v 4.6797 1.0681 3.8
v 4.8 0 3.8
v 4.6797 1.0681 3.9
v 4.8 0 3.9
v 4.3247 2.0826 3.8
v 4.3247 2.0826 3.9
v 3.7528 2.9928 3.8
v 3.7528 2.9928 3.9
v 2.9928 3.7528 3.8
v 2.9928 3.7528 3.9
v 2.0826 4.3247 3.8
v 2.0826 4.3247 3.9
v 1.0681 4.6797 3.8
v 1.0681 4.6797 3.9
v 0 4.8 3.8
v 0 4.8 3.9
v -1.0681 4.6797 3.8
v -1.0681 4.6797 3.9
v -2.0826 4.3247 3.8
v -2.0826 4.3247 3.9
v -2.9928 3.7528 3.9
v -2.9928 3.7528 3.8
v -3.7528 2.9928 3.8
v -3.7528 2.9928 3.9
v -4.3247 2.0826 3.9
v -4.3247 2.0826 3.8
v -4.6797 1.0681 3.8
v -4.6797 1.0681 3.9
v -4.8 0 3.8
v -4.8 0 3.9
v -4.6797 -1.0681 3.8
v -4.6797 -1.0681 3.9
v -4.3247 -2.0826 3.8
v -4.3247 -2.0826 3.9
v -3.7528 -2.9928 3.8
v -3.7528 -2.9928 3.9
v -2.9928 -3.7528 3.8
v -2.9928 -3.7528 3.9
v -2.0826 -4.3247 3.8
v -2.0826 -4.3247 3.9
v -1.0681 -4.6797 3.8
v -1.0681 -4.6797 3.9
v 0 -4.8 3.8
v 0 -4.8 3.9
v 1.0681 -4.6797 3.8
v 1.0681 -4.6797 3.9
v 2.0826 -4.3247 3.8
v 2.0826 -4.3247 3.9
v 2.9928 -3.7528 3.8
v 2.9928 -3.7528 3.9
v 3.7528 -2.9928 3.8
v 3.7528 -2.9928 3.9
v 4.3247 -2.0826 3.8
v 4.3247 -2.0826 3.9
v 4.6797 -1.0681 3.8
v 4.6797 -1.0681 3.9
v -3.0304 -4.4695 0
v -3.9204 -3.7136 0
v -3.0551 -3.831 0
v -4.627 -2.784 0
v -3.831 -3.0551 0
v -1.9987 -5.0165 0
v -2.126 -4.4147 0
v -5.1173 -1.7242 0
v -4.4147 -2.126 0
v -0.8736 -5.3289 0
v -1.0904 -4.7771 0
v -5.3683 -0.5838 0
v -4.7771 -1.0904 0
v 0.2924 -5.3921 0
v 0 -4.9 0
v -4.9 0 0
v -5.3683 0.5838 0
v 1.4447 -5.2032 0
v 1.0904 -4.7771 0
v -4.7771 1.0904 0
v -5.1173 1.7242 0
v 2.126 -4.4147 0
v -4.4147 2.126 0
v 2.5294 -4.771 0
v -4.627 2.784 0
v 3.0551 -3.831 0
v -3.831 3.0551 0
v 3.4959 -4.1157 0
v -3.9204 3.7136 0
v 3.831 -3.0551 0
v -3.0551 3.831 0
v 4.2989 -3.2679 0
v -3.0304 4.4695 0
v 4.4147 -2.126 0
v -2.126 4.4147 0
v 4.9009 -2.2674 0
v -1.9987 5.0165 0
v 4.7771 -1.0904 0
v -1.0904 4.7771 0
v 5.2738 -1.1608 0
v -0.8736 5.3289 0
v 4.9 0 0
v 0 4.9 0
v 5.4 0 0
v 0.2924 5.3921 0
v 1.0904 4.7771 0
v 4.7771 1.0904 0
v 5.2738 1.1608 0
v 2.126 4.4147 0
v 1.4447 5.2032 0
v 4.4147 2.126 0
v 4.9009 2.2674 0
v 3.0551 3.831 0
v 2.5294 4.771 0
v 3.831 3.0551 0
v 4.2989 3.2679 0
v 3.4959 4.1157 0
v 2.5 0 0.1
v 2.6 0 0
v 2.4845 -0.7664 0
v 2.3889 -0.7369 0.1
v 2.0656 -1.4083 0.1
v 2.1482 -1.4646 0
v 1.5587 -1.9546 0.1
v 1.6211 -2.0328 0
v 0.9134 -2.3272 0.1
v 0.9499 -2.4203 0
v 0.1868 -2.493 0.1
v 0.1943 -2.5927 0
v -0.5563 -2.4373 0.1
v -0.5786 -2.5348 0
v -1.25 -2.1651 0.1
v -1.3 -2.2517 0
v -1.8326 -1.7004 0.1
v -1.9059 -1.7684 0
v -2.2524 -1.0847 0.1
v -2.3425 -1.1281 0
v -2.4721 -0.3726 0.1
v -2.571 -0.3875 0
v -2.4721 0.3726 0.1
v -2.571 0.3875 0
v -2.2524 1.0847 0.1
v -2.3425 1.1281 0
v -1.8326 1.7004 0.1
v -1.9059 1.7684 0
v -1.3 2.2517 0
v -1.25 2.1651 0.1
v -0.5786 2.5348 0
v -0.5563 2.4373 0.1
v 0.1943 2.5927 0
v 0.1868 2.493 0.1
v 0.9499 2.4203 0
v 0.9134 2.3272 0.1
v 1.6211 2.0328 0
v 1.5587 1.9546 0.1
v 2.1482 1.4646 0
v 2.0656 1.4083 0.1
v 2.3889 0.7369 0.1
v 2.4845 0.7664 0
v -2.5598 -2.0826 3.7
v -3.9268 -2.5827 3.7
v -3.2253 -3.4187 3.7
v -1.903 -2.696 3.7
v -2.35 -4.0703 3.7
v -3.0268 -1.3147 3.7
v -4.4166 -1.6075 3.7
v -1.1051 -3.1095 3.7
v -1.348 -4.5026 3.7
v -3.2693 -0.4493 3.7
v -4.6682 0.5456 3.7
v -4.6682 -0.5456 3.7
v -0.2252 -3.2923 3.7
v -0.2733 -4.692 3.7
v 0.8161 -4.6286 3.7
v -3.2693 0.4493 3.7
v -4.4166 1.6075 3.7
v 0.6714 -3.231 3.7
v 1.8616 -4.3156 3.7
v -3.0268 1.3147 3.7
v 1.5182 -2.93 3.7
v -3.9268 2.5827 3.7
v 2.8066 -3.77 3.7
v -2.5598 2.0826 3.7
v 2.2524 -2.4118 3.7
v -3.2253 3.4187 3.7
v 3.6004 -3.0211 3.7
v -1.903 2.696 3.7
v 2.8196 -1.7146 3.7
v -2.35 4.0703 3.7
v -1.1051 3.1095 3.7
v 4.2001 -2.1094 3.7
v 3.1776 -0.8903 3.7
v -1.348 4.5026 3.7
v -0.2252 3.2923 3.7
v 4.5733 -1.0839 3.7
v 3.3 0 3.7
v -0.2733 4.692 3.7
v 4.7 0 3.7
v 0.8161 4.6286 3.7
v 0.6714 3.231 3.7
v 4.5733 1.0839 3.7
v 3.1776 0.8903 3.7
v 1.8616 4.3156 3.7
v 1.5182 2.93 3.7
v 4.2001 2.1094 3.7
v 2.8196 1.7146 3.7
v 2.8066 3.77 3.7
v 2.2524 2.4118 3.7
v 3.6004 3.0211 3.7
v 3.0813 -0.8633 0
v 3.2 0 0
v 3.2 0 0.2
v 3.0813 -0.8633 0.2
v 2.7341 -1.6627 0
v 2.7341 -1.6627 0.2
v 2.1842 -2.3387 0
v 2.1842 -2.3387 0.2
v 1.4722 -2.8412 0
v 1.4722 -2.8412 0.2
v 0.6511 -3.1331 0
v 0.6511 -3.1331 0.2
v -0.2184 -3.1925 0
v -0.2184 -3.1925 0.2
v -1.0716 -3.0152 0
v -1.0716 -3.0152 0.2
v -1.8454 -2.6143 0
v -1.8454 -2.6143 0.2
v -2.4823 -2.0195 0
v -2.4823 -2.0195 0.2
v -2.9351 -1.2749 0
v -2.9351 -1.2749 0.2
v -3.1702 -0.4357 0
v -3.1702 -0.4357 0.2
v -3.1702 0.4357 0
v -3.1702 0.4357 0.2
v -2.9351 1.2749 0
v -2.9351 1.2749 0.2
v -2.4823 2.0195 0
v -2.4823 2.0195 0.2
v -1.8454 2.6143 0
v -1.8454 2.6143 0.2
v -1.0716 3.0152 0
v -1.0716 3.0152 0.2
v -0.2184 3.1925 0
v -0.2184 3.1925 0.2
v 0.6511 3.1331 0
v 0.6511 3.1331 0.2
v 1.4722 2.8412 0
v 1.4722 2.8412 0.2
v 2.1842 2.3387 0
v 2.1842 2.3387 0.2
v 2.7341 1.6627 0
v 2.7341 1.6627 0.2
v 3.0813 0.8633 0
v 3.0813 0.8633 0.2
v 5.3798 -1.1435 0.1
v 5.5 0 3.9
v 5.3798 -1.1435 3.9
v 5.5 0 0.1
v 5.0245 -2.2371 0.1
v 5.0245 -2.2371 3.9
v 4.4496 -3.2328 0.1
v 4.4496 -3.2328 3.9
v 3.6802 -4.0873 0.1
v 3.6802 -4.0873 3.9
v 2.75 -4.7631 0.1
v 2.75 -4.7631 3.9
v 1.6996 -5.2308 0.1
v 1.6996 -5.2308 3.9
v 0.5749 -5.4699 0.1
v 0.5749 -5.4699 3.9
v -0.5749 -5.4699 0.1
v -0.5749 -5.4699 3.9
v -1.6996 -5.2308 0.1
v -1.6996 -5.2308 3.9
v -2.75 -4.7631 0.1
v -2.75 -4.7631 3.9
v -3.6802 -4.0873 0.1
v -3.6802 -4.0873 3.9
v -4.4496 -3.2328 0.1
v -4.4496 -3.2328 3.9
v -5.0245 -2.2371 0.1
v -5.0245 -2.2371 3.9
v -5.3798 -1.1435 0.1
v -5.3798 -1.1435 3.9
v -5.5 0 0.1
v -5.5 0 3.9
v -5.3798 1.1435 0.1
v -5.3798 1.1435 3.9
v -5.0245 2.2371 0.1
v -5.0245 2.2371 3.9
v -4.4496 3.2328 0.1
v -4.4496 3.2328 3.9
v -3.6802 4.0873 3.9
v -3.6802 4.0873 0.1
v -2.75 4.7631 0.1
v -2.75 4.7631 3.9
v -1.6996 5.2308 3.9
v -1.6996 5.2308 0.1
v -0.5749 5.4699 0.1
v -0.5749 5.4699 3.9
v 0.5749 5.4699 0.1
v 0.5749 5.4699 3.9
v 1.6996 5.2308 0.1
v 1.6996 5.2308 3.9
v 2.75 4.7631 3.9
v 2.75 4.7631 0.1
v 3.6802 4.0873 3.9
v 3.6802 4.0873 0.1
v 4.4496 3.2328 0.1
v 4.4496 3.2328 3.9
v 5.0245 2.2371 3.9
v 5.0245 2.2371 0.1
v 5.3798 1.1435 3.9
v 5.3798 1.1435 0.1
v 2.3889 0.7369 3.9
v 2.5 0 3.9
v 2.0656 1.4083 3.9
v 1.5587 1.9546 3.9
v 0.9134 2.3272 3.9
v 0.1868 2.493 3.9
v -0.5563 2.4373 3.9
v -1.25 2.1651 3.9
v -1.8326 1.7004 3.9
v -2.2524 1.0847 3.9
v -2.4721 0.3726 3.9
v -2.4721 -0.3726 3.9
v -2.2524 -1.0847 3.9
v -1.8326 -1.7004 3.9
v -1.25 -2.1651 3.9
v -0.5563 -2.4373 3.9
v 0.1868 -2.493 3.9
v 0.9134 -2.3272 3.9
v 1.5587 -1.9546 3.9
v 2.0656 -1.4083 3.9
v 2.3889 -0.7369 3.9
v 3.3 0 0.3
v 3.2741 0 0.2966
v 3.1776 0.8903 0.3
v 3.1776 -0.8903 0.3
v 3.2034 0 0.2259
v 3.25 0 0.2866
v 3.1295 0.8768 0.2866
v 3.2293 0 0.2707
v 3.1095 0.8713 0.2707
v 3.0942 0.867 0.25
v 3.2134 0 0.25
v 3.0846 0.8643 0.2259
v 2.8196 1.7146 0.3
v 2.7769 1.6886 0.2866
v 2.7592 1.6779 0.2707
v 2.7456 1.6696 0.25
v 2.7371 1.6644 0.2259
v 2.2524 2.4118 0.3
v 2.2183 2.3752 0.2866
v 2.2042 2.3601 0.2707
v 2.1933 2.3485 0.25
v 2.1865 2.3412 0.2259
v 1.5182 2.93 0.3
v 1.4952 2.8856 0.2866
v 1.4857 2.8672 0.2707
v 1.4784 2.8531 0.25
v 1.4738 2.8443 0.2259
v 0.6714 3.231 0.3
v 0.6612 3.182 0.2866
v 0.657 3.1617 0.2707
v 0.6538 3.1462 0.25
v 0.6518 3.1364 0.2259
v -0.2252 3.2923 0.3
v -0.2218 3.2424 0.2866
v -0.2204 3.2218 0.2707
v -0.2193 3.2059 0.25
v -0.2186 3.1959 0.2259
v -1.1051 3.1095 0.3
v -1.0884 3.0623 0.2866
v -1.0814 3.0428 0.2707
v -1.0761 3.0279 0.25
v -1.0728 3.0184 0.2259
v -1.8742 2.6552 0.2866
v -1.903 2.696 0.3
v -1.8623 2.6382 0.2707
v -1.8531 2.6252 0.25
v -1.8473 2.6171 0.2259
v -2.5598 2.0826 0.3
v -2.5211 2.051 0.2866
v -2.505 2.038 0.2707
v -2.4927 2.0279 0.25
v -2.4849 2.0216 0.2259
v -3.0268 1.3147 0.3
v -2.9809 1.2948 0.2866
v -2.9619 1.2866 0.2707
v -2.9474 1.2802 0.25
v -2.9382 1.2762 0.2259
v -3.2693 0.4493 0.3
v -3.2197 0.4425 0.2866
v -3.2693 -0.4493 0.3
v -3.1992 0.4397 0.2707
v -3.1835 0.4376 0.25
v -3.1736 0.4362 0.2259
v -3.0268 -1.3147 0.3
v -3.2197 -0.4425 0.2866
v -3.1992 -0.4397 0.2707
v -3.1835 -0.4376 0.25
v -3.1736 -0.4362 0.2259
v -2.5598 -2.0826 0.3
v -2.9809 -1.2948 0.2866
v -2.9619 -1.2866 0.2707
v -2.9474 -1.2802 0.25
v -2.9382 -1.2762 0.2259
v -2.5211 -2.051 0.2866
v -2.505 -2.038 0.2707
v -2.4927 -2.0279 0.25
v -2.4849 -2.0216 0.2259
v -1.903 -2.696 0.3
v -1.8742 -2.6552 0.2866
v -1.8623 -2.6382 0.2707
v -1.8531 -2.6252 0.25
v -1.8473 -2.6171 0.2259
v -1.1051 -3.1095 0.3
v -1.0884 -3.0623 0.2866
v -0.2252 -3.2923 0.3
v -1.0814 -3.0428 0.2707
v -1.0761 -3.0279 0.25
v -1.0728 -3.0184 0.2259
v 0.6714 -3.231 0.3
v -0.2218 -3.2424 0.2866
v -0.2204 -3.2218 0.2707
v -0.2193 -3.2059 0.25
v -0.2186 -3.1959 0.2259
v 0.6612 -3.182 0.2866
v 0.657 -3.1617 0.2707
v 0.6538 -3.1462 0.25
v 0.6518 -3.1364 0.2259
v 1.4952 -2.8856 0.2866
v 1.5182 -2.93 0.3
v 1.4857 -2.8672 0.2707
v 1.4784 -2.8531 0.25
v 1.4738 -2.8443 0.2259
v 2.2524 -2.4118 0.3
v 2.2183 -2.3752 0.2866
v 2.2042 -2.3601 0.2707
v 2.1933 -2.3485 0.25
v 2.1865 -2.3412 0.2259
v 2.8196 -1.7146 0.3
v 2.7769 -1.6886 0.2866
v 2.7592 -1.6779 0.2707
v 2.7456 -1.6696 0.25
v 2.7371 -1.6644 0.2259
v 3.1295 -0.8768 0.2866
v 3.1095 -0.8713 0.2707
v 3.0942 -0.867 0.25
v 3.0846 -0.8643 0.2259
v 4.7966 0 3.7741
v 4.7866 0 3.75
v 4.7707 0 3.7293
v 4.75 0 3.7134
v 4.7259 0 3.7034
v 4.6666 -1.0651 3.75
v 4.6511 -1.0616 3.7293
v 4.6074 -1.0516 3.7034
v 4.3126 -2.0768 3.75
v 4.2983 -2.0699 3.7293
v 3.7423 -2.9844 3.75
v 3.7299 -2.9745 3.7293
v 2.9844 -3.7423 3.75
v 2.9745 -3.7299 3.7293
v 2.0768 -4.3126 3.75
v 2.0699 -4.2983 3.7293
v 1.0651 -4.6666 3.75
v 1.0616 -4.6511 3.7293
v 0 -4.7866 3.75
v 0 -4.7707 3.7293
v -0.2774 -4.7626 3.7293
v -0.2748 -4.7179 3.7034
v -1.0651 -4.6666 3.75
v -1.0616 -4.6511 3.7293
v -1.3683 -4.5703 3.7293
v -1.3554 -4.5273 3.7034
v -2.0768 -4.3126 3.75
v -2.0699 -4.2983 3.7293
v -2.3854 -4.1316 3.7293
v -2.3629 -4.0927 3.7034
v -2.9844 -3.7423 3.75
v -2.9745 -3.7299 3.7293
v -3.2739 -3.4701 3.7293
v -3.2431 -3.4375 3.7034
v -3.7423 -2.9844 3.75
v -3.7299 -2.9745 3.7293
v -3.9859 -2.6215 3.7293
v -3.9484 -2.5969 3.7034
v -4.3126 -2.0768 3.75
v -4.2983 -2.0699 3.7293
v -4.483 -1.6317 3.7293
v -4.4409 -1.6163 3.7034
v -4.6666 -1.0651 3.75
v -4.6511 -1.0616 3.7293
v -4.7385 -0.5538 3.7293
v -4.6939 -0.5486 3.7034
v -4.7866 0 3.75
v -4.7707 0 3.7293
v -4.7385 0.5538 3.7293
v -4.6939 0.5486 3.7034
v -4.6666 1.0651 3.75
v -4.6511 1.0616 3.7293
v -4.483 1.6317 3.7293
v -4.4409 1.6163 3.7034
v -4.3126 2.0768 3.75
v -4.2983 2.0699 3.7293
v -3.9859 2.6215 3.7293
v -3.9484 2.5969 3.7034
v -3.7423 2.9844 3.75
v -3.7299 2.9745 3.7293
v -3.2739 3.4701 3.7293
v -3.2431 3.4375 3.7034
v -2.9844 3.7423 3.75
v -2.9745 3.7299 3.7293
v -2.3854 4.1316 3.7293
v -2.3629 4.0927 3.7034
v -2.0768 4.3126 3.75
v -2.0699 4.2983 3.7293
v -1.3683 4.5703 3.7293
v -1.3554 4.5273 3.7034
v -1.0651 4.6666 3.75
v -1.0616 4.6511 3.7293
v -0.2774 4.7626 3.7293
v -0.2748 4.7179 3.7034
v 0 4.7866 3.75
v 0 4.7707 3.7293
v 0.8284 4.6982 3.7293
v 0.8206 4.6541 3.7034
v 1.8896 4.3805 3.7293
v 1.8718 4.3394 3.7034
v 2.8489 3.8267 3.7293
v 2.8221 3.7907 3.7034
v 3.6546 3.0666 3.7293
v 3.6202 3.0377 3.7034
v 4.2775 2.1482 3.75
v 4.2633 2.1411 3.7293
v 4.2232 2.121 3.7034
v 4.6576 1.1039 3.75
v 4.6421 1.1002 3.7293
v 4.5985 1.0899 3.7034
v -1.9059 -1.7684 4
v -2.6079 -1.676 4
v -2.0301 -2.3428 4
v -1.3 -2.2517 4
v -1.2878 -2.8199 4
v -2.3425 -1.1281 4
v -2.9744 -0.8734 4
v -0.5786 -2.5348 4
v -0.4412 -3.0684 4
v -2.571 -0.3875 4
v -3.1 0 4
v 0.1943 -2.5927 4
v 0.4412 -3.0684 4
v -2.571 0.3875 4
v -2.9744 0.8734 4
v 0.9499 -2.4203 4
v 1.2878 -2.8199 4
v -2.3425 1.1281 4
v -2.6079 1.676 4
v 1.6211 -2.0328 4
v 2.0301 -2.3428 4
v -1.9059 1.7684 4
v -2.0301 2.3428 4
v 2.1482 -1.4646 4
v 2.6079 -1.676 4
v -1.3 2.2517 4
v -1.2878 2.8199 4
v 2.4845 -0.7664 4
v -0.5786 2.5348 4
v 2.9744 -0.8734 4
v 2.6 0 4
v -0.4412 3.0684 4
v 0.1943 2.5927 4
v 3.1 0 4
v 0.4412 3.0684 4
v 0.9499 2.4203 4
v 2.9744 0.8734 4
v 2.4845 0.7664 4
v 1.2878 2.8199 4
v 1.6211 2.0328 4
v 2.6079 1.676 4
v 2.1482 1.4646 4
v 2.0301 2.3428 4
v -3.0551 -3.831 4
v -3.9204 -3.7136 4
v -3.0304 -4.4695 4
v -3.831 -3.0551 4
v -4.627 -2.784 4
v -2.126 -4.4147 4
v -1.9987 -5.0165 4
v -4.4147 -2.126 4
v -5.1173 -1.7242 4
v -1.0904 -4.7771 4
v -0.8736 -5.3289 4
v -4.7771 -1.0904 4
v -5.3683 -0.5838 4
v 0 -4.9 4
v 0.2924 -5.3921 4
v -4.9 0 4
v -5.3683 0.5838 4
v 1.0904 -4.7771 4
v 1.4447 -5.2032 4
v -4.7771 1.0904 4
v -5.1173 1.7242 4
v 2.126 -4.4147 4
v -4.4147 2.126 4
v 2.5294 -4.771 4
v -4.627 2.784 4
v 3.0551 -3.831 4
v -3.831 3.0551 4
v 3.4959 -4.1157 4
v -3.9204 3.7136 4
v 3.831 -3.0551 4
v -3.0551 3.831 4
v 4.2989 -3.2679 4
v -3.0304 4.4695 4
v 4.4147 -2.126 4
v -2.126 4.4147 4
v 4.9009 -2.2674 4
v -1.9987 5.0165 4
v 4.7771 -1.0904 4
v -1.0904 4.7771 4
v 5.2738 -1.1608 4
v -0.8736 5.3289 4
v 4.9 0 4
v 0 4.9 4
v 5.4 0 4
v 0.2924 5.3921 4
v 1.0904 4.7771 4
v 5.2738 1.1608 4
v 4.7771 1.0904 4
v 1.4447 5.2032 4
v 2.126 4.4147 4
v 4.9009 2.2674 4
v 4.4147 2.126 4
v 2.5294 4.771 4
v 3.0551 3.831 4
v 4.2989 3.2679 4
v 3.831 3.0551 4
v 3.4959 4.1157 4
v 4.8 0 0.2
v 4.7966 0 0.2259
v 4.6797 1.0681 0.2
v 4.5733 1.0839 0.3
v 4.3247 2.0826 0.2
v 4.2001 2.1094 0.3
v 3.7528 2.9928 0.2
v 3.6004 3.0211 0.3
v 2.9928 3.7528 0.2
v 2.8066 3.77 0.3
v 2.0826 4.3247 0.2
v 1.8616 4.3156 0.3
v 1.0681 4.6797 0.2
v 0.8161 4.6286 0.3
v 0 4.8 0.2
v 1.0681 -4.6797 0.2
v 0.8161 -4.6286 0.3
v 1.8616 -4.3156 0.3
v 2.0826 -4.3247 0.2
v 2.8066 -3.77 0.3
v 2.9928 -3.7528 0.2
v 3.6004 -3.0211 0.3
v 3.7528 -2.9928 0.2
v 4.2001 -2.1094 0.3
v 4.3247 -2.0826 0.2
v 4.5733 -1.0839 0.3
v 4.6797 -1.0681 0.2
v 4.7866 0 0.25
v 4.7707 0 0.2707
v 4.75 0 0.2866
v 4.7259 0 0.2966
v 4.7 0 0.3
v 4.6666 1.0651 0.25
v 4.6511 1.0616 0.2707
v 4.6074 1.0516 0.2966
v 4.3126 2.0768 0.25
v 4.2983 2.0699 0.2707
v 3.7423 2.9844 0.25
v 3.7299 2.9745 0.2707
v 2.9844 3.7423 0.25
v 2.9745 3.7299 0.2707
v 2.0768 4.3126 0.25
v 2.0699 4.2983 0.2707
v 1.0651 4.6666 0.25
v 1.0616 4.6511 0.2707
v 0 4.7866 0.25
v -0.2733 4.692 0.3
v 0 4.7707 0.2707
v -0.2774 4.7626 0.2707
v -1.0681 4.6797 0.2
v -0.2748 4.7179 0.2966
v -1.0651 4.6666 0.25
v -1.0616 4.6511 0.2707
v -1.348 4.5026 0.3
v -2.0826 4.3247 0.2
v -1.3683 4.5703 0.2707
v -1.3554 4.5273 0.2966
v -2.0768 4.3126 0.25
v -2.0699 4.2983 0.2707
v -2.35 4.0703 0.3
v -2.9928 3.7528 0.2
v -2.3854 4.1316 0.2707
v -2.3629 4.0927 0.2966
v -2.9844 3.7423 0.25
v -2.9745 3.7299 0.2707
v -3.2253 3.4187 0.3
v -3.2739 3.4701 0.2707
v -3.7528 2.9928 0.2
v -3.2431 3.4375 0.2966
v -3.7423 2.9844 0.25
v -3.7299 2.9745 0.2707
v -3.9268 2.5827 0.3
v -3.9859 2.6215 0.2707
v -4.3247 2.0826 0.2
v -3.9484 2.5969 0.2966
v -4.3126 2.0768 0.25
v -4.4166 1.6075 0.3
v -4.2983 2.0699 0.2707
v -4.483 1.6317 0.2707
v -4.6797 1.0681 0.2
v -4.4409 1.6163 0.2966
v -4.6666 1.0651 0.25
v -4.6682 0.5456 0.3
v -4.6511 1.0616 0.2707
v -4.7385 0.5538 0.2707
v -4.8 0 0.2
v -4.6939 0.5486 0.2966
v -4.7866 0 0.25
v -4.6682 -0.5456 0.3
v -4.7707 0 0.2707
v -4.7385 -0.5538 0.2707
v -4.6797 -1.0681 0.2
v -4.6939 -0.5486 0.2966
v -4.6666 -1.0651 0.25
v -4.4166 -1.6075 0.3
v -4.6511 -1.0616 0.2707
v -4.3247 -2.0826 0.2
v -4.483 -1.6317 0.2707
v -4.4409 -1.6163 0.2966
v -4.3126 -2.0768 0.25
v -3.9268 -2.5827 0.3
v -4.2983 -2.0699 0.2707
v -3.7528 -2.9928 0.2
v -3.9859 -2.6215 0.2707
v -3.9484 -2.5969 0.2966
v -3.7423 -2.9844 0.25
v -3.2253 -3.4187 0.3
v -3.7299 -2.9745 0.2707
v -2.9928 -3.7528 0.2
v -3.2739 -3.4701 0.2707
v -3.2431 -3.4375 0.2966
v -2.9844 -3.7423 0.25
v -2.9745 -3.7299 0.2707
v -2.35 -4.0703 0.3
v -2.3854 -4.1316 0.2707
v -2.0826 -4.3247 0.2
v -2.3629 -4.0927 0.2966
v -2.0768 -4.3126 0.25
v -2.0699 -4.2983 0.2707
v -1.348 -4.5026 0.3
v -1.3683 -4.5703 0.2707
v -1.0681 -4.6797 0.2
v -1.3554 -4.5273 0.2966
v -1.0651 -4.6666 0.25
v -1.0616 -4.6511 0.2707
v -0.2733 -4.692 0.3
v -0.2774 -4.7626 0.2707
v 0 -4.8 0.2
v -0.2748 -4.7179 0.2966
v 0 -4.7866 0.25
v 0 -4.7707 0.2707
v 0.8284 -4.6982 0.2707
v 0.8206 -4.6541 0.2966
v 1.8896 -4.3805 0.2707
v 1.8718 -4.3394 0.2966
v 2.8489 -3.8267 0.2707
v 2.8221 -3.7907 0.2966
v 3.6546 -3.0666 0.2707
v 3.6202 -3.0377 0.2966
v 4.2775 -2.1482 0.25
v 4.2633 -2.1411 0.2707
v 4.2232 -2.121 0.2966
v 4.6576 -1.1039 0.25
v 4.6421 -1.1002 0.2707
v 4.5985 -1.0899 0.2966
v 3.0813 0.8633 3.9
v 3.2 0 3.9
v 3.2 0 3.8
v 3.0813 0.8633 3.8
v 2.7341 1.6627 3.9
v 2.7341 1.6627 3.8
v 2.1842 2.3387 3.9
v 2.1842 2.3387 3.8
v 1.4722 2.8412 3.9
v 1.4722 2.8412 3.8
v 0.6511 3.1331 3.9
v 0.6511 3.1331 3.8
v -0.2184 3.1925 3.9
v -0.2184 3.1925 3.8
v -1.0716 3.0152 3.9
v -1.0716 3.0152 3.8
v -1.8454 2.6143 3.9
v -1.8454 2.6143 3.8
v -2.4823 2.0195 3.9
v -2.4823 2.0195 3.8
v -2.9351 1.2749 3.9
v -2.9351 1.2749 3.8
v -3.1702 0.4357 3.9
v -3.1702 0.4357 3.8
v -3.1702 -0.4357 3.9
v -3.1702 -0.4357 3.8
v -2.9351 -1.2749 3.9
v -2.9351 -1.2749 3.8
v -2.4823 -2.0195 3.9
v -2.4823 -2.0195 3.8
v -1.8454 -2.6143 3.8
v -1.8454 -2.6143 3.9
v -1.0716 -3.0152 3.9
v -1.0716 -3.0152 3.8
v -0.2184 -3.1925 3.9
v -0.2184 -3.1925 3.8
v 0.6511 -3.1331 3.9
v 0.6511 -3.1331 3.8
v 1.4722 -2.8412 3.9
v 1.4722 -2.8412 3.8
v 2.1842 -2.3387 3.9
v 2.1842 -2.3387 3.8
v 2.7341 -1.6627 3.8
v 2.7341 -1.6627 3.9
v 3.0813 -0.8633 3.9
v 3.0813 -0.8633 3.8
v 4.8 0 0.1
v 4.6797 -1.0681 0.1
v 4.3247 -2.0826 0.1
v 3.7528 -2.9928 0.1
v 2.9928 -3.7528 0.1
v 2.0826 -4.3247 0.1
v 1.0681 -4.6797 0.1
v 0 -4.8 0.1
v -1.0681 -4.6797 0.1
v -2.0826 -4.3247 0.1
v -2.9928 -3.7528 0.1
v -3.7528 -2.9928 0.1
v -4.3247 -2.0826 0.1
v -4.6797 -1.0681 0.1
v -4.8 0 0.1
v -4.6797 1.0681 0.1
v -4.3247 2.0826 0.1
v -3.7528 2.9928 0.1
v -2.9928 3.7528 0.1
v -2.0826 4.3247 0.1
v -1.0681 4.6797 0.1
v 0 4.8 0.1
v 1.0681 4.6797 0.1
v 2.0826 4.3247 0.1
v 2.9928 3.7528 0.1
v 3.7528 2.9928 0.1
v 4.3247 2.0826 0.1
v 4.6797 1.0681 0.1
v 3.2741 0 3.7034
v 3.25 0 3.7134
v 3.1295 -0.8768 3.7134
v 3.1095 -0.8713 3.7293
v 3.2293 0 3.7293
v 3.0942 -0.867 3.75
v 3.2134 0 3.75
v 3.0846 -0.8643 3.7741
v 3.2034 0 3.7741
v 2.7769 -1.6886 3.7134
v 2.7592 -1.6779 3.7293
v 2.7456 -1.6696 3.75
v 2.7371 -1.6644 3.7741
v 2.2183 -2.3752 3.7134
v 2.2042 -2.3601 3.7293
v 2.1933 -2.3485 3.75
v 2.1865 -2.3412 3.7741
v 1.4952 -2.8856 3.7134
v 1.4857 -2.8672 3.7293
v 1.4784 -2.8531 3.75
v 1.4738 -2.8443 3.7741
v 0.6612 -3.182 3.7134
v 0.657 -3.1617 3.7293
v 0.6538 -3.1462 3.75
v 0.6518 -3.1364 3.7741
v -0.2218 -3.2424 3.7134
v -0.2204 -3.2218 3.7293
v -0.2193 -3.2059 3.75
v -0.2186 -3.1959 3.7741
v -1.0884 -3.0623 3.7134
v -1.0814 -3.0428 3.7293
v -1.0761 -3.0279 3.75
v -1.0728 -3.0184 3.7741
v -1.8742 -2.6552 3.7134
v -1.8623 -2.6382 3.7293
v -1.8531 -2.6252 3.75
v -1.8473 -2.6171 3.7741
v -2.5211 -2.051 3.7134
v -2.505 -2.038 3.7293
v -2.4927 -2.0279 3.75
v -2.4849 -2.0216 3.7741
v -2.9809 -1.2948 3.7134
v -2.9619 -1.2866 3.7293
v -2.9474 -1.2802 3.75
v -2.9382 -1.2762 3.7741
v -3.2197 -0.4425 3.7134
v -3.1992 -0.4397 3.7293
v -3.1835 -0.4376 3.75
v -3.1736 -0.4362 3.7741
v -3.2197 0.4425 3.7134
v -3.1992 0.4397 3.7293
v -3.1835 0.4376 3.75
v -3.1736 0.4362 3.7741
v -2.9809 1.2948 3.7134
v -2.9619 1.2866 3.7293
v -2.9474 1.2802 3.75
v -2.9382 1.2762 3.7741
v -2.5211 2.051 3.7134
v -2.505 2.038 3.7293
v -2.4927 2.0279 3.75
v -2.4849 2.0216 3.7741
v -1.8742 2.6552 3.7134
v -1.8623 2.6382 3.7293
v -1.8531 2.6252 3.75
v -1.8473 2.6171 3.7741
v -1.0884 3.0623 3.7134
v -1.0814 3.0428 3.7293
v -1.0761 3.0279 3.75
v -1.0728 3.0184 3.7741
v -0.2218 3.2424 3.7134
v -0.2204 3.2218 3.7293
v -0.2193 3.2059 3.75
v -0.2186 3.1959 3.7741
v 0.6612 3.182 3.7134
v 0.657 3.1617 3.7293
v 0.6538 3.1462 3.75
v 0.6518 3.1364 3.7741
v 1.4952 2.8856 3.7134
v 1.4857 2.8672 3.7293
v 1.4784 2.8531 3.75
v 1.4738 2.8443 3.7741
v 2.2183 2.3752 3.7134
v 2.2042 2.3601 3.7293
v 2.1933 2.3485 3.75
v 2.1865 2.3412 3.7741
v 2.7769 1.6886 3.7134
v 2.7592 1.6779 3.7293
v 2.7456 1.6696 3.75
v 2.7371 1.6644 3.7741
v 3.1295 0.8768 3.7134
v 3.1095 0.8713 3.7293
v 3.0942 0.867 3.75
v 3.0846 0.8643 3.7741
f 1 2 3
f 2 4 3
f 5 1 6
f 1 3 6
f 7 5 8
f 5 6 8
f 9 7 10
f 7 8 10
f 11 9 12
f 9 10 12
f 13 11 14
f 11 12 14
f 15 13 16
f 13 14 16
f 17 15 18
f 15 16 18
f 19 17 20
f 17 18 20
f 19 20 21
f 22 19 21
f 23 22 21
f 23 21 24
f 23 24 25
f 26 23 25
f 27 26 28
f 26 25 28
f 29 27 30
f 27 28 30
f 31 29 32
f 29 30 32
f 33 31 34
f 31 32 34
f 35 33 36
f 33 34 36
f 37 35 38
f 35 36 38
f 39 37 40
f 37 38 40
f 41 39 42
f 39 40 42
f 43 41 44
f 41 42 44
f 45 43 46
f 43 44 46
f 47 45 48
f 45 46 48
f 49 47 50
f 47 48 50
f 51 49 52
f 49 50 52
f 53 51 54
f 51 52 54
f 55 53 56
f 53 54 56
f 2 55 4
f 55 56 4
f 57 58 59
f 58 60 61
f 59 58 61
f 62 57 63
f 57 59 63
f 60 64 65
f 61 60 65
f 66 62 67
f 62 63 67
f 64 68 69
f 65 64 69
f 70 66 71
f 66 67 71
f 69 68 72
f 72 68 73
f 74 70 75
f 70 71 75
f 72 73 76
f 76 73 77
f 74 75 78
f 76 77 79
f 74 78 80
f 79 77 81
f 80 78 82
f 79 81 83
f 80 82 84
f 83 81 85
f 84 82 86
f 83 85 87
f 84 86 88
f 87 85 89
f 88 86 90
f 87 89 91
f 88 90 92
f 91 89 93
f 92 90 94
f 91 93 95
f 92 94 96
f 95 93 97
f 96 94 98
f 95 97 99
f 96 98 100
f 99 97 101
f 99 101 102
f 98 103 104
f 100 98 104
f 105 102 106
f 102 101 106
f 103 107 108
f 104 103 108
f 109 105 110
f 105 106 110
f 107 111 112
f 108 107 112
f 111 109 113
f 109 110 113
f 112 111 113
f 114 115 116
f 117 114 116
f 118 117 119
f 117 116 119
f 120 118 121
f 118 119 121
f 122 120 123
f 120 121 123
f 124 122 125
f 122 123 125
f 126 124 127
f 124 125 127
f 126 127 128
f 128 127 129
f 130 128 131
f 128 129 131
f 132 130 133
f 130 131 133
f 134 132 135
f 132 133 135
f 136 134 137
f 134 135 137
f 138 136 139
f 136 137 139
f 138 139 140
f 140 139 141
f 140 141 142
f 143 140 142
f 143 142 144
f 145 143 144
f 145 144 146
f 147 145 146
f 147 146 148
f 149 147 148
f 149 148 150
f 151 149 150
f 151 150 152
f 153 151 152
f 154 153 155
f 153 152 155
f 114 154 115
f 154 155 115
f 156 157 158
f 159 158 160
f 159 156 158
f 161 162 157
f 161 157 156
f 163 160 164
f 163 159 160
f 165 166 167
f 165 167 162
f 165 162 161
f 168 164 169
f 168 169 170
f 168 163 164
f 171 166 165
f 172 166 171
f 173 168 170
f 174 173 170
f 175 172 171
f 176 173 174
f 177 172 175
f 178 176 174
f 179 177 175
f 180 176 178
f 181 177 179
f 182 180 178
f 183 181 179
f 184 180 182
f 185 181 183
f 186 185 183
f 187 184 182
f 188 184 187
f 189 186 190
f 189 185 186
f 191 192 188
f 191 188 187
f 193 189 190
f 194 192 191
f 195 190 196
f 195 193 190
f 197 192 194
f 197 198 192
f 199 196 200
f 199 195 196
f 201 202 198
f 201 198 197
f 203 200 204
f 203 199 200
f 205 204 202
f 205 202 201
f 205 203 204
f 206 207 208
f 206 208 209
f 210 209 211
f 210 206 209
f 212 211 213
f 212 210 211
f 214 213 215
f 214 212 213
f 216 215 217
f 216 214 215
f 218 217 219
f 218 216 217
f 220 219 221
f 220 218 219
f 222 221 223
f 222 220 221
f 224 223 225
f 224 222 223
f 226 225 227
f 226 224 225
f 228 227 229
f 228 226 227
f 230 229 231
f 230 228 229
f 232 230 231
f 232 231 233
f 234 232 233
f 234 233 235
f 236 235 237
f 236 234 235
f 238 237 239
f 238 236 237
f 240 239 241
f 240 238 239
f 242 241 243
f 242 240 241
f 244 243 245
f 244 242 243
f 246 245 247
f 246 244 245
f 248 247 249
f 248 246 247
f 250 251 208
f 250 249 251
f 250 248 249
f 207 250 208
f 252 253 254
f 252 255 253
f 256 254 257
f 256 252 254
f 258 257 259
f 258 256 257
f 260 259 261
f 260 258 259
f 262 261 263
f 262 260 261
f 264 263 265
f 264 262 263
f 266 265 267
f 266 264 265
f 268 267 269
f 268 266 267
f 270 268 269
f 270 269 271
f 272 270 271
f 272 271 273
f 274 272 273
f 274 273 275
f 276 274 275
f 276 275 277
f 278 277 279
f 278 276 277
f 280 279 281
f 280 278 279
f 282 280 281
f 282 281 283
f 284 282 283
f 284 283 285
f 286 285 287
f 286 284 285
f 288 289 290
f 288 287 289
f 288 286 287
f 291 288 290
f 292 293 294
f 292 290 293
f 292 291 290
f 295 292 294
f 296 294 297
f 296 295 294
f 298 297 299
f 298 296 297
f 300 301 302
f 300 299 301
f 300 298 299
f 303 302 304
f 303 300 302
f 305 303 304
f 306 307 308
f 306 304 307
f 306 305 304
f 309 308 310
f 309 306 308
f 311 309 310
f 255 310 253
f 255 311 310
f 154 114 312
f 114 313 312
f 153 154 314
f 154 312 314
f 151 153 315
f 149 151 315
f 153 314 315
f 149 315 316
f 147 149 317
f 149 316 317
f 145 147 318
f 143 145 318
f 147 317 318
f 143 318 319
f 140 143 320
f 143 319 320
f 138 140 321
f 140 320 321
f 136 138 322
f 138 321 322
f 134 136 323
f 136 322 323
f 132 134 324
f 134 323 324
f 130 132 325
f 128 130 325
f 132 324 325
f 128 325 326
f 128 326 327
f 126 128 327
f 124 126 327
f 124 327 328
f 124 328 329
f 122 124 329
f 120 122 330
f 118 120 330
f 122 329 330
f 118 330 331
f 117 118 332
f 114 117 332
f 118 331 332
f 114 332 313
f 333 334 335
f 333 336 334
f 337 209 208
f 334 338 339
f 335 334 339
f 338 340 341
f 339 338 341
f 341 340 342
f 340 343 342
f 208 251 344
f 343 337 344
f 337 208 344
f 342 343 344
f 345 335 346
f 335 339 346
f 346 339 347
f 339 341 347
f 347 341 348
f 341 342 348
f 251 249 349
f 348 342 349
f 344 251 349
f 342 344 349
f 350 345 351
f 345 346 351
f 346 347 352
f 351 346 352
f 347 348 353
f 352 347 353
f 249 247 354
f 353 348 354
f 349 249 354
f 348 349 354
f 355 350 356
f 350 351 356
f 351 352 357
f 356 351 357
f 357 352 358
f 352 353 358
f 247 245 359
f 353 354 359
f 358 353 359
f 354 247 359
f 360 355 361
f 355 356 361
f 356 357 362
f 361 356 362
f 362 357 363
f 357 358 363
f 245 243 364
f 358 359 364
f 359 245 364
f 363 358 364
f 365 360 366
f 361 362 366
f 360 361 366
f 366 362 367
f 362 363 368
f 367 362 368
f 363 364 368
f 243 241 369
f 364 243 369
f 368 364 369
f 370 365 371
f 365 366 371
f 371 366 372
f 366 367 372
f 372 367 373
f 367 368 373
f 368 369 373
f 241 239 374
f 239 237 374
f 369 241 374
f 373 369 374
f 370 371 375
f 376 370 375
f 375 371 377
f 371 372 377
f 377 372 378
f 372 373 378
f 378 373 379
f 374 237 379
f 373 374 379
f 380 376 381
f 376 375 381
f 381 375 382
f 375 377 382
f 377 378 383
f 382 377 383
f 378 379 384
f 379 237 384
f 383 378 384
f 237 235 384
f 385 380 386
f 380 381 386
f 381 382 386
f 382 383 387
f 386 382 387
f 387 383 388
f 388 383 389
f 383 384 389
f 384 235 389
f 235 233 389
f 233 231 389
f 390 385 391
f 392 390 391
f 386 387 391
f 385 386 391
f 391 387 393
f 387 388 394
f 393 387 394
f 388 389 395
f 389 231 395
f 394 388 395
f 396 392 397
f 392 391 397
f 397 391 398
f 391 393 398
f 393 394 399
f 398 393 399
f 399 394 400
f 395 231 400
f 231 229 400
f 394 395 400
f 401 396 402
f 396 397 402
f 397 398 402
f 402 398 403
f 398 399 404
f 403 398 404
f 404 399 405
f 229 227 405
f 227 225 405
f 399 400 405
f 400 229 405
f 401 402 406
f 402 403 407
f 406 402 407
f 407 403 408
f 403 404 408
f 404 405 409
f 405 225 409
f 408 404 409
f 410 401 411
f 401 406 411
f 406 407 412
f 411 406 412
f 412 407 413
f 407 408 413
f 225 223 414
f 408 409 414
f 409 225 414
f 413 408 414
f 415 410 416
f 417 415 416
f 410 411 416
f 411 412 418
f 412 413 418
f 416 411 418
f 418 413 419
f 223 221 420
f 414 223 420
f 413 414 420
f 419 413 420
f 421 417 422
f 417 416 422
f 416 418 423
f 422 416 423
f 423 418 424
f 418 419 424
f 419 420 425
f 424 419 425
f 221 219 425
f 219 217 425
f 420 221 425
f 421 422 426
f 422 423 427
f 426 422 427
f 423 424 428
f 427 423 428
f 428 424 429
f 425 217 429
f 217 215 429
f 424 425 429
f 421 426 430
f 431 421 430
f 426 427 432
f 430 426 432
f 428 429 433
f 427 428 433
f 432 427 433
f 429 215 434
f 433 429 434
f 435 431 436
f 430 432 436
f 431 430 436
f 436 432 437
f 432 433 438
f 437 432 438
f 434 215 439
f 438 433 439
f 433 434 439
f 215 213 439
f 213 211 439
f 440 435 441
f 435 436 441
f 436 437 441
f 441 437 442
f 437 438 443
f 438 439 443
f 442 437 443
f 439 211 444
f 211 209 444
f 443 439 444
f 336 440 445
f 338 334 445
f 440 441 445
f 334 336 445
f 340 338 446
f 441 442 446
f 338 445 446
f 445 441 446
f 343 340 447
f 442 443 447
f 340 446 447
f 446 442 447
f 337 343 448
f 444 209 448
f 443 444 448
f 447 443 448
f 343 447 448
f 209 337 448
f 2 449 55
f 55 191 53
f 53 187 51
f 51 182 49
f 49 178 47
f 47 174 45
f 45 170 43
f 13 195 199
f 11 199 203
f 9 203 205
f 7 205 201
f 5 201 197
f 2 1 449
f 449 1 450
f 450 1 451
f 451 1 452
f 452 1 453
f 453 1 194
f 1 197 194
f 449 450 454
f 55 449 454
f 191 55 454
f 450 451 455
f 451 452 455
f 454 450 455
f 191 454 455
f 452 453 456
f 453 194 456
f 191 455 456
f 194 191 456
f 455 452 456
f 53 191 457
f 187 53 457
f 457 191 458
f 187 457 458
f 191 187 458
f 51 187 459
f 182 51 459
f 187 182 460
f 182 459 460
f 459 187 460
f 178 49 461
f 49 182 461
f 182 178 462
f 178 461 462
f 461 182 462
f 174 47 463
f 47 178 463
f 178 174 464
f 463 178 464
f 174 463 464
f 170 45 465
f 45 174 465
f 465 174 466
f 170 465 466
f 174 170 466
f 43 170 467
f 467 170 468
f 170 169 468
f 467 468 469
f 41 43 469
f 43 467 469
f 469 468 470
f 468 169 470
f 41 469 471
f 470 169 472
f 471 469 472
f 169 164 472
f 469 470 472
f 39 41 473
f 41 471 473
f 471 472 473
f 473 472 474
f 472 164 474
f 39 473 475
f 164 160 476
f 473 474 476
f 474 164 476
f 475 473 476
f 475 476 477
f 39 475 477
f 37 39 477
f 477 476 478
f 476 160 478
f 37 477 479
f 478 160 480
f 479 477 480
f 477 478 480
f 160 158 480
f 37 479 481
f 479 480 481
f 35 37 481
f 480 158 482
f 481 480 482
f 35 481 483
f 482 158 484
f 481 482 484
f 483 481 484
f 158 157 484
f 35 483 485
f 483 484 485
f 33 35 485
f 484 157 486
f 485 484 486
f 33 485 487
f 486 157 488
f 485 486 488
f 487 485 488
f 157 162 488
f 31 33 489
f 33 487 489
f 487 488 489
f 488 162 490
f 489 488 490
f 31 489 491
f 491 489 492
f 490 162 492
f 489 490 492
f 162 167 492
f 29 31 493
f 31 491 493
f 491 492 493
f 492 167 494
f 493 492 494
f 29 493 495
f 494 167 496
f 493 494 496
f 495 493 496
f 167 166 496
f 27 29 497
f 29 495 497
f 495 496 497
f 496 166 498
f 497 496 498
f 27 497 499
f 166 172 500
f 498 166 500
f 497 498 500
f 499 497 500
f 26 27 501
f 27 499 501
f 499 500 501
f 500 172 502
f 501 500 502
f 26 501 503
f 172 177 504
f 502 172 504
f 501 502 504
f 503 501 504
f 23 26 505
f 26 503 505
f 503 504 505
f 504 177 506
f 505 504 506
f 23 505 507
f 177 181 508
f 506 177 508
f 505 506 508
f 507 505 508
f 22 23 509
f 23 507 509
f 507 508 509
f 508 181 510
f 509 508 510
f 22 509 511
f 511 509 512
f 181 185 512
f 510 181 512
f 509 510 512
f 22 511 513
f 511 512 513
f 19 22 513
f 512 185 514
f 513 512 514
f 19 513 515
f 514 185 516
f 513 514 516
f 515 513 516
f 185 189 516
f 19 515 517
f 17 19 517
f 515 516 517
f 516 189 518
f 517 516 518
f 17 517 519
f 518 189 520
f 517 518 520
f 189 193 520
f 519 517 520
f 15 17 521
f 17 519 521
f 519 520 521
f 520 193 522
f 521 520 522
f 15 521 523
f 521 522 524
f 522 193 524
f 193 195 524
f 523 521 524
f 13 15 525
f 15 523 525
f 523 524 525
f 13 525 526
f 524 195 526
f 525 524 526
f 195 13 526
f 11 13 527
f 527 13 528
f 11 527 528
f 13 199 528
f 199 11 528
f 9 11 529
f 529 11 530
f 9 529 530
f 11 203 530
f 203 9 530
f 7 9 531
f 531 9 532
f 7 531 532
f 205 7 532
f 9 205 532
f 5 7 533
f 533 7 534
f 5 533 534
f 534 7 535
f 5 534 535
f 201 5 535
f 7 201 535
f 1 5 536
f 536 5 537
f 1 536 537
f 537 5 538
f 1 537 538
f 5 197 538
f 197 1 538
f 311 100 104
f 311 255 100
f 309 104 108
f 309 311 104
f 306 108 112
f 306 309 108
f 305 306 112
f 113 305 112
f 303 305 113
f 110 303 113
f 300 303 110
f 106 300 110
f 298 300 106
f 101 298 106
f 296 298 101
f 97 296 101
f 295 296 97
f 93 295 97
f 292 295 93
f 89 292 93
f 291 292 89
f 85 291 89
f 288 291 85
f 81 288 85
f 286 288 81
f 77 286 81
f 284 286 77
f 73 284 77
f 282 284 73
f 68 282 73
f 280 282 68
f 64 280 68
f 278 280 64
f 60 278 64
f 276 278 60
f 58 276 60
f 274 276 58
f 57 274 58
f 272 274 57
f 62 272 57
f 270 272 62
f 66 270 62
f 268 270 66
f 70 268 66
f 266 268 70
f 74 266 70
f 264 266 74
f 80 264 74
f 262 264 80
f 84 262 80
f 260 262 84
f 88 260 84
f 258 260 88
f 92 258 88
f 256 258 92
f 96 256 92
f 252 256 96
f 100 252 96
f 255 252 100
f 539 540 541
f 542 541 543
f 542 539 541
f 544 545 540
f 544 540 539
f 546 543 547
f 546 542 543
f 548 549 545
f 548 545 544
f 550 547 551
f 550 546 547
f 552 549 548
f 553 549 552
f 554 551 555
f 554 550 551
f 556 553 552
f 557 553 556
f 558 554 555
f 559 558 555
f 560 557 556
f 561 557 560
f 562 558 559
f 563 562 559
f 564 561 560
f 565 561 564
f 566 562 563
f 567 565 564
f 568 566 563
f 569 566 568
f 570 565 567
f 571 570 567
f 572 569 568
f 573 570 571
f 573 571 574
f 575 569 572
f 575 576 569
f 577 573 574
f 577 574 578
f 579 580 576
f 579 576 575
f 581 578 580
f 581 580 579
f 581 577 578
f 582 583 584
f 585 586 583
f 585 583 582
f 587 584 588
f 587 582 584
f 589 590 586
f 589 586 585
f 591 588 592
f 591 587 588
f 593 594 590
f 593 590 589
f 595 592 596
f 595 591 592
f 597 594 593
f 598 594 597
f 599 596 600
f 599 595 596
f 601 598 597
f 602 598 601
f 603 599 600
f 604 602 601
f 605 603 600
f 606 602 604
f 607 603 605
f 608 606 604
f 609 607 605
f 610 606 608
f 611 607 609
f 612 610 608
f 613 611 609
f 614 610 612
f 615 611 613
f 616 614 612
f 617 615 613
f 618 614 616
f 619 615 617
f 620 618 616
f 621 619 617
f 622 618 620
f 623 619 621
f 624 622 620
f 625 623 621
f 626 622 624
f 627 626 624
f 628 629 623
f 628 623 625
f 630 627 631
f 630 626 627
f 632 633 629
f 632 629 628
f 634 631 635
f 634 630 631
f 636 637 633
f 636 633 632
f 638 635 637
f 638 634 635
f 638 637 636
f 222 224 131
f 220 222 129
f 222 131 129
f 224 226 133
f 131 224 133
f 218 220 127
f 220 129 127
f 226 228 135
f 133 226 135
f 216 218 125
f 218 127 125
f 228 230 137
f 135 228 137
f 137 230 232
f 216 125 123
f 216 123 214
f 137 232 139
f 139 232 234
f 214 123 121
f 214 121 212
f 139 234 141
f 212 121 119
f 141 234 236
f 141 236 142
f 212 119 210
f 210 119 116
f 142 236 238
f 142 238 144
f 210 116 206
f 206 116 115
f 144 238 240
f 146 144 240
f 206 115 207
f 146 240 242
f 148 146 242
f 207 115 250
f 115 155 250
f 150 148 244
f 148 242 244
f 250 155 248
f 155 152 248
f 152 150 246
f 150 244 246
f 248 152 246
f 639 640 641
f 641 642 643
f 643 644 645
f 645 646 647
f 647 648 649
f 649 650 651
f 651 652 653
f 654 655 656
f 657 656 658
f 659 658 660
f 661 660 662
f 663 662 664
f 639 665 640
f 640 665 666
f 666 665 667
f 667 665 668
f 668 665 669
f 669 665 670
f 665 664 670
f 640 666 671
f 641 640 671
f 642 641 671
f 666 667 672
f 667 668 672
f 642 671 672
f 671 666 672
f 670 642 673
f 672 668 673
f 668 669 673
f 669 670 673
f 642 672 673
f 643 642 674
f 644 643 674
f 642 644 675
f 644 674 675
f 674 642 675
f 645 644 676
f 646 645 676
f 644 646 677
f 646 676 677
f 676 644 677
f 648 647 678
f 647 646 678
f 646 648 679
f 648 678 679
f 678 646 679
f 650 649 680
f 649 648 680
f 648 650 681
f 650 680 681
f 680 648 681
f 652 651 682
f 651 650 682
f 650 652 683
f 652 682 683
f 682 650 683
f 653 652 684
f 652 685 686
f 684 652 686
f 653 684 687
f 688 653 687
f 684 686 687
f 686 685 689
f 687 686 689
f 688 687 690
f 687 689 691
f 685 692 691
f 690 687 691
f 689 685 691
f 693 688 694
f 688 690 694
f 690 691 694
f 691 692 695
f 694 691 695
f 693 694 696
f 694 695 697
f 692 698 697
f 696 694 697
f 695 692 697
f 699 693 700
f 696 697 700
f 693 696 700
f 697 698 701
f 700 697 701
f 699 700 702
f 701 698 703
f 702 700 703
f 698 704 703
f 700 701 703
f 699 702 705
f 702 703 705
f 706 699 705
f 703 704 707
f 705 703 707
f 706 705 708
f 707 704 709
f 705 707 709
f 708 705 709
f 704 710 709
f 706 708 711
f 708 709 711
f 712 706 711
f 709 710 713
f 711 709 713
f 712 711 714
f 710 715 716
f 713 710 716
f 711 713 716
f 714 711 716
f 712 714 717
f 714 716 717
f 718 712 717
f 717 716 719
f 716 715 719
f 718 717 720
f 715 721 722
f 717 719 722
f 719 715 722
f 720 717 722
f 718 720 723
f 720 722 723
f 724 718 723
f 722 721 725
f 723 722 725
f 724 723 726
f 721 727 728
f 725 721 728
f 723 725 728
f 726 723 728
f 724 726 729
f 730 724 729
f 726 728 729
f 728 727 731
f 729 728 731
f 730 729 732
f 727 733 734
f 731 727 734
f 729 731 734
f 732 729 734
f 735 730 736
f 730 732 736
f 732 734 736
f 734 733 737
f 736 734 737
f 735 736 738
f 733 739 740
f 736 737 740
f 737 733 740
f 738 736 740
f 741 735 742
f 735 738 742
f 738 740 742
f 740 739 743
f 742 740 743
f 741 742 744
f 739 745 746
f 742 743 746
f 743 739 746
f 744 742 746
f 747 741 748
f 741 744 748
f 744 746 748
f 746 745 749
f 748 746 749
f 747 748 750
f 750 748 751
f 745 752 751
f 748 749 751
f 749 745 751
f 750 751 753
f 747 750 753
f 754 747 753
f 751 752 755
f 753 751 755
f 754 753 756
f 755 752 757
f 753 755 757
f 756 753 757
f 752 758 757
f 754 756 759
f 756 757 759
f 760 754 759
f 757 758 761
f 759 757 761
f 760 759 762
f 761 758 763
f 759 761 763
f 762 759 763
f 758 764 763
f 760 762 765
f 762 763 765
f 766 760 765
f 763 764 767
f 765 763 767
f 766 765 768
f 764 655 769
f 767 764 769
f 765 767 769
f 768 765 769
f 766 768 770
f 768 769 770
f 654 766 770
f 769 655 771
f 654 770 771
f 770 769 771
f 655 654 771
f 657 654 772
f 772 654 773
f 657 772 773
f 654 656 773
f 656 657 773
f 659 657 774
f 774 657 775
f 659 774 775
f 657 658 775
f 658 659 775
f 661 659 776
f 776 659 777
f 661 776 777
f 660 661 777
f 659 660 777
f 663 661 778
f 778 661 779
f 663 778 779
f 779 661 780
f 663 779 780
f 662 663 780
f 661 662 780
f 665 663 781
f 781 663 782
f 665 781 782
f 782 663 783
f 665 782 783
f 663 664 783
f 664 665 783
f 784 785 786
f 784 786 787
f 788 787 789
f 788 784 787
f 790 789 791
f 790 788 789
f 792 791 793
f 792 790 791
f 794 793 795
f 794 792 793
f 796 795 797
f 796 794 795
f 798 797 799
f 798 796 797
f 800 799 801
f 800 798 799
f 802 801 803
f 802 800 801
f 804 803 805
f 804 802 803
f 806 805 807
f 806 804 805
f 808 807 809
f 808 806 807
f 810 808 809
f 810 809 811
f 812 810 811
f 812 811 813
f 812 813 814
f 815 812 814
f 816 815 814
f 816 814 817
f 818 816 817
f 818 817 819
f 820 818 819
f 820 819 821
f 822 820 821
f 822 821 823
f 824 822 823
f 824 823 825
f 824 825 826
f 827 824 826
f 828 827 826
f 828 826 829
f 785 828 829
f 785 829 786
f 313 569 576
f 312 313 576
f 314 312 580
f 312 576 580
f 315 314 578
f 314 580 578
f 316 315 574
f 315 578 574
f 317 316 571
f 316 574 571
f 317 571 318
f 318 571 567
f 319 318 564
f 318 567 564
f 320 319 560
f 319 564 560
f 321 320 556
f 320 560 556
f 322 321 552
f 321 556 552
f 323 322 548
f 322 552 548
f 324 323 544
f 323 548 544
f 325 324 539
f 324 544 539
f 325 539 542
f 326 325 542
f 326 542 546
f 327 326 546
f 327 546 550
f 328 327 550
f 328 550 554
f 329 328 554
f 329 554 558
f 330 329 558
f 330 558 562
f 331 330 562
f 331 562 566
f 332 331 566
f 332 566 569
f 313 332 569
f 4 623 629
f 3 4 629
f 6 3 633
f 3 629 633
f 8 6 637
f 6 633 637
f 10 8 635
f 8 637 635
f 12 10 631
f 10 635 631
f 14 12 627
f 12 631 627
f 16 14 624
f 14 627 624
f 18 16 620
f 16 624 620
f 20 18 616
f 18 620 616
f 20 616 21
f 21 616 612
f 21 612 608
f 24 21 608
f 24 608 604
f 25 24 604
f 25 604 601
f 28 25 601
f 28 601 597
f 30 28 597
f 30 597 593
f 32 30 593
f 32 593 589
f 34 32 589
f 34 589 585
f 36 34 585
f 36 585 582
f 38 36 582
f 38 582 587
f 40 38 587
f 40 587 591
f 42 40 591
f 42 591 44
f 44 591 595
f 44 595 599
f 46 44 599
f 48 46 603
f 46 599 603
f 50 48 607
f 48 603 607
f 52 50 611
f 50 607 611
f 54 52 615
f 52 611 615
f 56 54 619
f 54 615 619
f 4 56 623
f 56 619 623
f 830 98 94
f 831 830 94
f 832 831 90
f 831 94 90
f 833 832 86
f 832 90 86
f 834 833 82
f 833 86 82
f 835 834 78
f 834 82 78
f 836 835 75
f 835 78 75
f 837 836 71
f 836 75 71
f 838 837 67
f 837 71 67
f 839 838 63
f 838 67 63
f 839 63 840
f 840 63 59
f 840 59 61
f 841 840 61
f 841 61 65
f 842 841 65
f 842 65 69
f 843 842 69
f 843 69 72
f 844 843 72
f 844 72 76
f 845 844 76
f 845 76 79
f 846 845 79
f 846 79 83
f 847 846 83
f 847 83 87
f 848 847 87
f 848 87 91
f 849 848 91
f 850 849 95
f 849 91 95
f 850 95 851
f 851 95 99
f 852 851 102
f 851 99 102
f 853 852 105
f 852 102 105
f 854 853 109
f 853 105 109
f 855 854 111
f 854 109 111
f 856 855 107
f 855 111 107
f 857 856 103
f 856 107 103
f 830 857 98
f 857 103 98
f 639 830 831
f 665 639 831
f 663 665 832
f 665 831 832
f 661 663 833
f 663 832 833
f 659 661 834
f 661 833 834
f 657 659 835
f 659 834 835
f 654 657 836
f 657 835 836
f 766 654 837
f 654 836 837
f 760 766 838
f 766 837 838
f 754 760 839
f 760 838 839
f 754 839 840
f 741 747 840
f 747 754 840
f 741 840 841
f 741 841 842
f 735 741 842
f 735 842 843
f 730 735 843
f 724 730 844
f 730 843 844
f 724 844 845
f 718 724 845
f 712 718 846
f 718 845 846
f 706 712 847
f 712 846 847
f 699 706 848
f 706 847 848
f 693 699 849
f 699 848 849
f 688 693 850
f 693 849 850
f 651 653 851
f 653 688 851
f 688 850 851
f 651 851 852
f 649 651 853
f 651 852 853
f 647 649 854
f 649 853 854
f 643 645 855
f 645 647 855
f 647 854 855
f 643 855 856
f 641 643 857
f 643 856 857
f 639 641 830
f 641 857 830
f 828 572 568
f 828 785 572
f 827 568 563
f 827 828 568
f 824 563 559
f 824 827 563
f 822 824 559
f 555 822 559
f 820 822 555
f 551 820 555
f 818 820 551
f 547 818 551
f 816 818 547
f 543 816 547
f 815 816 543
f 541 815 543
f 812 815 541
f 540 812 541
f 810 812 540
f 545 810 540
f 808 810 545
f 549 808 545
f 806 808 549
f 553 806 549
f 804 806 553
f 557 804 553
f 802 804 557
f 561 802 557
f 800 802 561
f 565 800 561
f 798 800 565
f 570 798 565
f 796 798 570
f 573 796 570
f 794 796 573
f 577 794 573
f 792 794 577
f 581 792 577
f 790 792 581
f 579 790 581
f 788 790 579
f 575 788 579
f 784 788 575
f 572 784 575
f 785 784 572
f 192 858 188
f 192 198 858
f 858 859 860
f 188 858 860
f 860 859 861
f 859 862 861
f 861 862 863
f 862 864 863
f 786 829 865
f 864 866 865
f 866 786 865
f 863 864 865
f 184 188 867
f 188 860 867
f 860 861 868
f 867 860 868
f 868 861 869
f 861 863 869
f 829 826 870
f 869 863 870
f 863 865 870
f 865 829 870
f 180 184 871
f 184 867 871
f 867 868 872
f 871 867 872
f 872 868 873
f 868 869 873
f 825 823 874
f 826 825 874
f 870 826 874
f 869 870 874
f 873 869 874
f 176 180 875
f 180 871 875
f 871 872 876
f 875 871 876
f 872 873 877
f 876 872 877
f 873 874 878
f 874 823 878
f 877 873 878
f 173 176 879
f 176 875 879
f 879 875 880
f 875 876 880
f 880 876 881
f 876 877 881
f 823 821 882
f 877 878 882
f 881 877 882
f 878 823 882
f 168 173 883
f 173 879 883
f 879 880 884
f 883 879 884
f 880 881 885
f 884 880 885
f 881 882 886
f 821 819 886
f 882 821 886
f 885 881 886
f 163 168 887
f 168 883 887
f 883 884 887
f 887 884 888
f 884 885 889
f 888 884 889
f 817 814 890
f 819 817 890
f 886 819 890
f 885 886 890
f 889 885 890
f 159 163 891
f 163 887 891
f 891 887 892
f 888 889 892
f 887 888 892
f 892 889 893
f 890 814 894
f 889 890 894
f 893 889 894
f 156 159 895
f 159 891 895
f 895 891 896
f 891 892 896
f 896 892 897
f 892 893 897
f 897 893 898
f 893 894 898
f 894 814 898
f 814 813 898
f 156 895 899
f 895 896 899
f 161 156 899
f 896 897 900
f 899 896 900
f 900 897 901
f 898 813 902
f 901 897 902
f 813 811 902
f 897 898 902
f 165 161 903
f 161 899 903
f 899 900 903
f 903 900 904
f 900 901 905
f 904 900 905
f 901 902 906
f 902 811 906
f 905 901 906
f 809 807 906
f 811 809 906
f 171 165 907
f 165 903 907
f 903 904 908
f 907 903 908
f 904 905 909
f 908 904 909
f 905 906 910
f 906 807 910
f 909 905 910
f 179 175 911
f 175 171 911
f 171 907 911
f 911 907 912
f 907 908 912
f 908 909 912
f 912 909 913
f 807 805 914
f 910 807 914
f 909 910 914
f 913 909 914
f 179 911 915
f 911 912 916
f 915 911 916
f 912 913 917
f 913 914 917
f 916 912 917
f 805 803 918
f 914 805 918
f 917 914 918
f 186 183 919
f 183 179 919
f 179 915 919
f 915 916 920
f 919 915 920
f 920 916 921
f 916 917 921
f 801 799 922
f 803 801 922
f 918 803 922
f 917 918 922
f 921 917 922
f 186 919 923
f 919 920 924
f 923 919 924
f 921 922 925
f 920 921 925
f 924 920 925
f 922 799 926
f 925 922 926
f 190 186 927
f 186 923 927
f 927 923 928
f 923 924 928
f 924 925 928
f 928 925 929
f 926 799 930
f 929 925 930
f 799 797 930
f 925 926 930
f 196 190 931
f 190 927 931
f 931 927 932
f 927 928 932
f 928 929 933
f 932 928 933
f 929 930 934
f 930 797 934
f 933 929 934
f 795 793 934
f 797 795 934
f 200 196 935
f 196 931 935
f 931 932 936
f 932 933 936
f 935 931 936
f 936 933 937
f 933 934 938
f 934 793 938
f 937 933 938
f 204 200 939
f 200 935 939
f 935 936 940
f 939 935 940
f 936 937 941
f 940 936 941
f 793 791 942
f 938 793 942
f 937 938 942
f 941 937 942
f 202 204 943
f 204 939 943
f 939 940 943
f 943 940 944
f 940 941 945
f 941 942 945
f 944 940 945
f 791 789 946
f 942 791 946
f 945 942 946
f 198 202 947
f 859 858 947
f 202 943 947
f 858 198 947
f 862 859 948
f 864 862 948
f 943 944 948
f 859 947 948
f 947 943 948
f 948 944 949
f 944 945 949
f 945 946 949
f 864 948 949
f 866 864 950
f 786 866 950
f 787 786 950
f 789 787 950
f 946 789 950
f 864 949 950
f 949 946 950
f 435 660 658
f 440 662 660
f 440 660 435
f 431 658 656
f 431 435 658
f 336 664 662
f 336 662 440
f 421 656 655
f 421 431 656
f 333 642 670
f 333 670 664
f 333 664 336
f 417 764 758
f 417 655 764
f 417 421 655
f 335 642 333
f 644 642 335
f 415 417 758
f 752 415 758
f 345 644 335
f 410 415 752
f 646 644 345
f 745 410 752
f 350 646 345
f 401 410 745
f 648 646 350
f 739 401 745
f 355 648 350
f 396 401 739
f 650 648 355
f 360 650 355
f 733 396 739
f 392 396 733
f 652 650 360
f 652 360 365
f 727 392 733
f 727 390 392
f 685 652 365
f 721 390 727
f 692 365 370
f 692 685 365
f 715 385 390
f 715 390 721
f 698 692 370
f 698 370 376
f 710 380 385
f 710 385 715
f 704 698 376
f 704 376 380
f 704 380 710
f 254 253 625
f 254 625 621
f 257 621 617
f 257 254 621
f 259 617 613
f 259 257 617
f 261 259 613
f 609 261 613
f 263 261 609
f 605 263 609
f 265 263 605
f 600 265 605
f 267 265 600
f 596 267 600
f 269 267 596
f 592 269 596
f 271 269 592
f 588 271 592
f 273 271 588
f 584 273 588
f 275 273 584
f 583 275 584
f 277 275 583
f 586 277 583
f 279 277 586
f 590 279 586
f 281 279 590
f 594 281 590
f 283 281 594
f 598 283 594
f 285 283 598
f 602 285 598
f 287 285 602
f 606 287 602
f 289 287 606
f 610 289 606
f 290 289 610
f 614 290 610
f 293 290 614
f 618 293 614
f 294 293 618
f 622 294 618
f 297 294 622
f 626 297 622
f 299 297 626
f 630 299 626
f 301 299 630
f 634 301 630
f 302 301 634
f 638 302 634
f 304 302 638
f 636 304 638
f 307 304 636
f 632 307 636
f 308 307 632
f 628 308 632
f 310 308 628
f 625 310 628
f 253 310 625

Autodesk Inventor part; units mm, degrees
ref_plane "YZ Plane" through (0, 0, 0) normal (1, 0, 0) x (0, 1, 0)
ref_plane "XZ Plane" through (0, 0, 0) normal (0, 1, 0) x (-1, 0, 0)
sketch "Sketch1" plane through (0, 0, 0) normal (0, 0, 1) x (1, 0, 0)
  circle A0 centre (0, 0) radius 5.5
  dimension "d0" = 11
extrude "Extrusion1" add sketch "Sketch1" along normal blind 4
sketch "Sketch2" plane through (0, 0, 4) normal (0, 0, 1) x (1, 0, 0)
  circle A0 centre (0, 0) radius 2.5
  dimension "d3" = 5
extrude "Extrusion2" cut sketch "Sketch2" against normal through all
sketch "Sketch3" plane through (0, 0, 4) normal (0, 0, 1) x (1, 0, 0)
  circle A0 centre (0, 0) radius 3.2
  circle A1 centre (0, 0) radius 4.8
  circle A2 centre (0, 0) radius 2.5 projected
  circle A3 centre (0, 0) radius 5.5 projected
  dimension "d6" = 0.7
  dimension "d7" = 0.7
extrude "Extrusion3" cut sketch "Sketch3" against normal blind 0.3 contours A1
chamfer "Chamfer1" distance 0.1 angle 45 4 edges at (-4.8, 0, 4) (-5.5, 0, 4) (-3.2, 0, 4) (-2.5, 0, 4)
fillet "Fillet1" radius 0.1 2 edges at (-4.8, 0, 3.7) (-3.2, 0, 3.7)
ref_plane "Work Plane1" through (0, 0, 2) normal (0, 0, 1) x (1, 0, 0)
mirror "Mirror1" about plane through (0, 0, 2) normal (0, 0, 1) of "Extrusion3", "Fillet1"
chamfer "Chamfer2" distance 0.1 angle 45 3 edges at (-5.5, 0, 0) (-4.8, 0, 0) (-2.5, 0, 0)
properties part number "MR115 2RS" material "Steel, Alloy"
